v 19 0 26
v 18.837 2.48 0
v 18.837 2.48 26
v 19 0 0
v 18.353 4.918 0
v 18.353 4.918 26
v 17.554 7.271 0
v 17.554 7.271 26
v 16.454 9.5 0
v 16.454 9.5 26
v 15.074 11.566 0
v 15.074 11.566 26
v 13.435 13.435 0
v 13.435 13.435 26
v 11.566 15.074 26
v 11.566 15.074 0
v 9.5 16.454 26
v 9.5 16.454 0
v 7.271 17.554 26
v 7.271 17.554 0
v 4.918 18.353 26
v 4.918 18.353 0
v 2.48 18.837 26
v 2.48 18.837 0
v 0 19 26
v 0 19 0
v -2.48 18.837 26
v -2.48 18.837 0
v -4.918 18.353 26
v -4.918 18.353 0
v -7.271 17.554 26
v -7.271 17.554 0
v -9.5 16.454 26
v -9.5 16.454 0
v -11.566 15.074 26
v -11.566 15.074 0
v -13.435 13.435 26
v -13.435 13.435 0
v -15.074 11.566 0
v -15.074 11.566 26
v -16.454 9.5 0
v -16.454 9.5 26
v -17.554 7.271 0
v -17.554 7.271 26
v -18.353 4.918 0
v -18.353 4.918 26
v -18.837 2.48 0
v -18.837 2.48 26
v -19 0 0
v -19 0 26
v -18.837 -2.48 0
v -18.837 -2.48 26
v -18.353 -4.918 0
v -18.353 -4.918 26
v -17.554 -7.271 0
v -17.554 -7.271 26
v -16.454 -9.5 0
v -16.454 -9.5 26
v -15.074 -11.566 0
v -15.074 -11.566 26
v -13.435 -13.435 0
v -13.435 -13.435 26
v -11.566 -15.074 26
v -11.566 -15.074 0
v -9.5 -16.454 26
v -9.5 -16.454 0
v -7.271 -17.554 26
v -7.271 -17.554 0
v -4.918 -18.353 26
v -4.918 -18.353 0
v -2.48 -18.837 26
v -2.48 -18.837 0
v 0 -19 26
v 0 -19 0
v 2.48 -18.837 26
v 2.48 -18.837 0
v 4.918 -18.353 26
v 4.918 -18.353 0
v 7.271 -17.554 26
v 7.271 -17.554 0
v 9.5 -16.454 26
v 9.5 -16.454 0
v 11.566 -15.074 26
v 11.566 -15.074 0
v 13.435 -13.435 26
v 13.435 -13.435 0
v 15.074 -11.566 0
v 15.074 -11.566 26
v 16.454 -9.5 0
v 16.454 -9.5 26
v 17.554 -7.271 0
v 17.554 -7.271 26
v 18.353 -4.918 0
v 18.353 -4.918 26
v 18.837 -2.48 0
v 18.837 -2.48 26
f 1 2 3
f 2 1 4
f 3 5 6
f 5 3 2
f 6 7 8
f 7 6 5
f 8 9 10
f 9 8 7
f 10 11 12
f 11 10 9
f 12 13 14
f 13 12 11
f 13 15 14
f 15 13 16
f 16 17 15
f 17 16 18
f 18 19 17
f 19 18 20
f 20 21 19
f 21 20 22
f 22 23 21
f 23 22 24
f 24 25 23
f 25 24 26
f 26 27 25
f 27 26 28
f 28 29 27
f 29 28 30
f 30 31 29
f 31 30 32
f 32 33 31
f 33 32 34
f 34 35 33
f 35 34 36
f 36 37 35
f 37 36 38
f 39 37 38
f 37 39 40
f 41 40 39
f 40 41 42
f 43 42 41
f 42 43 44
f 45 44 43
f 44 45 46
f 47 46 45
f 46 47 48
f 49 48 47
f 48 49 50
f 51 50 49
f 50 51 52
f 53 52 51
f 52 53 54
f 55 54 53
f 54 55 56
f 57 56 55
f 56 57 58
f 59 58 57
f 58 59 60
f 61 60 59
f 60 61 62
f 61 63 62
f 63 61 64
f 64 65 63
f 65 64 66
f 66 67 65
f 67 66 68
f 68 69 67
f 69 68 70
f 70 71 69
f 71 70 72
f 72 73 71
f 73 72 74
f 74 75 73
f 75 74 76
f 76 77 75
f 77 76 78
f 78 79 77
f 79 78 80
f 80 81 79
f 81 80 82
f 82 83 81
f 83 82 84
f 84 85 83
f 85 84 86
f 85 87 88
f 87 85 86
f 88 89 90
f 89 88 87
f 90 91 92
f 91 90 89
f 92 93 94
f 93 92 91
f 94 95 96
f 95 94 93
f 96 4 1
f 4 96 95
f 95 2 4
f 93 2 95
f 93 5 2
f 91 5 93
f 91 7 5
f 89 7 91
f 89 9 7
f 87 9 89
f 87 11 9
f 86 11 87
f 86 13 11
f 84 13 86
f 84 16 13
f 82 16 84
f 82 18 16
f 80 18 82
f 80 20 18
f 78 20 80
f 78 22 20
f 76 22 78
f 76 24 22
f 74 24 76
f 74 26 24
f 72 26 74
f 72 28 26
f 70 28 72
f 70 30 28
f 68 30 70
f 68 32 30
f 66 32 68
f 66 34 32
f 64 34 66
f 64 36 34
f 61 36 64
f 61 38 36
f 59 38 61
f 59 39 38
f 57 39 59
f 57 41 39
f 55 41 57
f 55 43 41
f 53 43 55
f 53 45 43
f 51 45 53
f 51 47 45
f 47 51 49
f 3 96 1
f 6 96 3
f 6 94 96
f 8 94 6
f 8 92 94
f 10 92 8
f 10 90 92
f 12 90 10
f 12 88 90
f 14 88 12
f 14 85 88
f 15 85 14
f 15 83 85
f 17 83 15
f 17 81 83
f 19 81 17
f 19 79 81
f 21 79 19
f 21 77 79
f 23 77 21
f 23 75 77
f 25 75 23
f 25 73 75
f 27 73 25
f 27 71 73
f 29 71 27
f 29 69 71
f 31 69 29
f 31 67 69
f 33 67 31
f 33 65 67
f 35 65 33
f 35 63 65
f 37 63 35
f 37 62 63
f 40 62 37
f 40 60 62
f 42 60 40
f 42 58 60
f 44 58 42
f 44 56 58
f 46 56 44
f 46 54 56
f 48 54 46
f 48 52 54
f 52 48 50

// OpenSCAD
// file: ../common/ds_lib.scad
// DronSwarm · librería común de piezas del frame (S07-S08). Unidades: mm.
//
// Reglas (ADR-003): sin hull()/minkowski()/offset() — FreeCAD los convierte en malla y el STEP deja de ser un
// sólido válido. Las formas redondeadas se arman con uniones de cubos y cilindros. El importador CSG de FreeCAD
// también falla con booleanas 2D y con varios operandos agrupados bajo una sola transformación: cada grupo de
// agujeros debe ser hijo directo del difference(), con su propio translate.
//
// Interfaz de motor DronSwarm (DMI, ADR-011): placa con 4 ranuras radiales a 90°, de modo que el mismo soporte
// acepta varios patrones comerciales y, más adelante, el motor propio (S17+) se diseña para caer en el mismo rango.
//   DMI-S: 4×M3, círculo de tornillos Ø16-Ø25 (motores 28xx-41xx, ≤ 600 W)
//   DMI-L: 4×M4, círculo de tornillos Ø30-Ø42 (motores 50xx-70xx, ≤ 2 kW)

$fn = 48;

M3 = 3.3; M3_HEAD = 6.0; M3_NUT = 6.4;     // pasante, cabeza, tuerca (entre caras + juego)
M4 = 4.4; M4_HEAD = 7.5;
M5 = 5.4;

function dmi_bolt(iface) = iface == "L" ? M4 : M3;
function dmi_r(iface) = iface == "L" ? [15, 21] : [8, 12.5];   // radio mínimo y máximo de las ranuras
function dmi_plate_d(iface) = iface == "L" ? 56 : 36;
function dmi_center(iface) = iface == "L" ? 16 : 10;            // eje, seguro y paso de cables

// Rectángulo con esquinas redondeadas (2D) y su extrusión
module rrect2d(size, r) {
    r2 = min(r, size[0] / 2 - 0.01, size[1] / 2 - 0.01);
    union() {
        translate([r2, 0]) square([size[0] - 2 * r2, size[1]]);
        translate([0, r2]) square([size[0], size[1] - 2 * r2]);
        for (x = [r2, size[0] - r2], y = [r2, size[1] - r2]) translate([x, y]) circle(r = r2);
    }
}
// Caja redondeada con primitivas 3D (sin booleanas 2D: el importador CSG de FreeCAD falla con ellas)
module rbox(size, r) {
    r2 = min(r, size[0] / 2 - 0.01, size[1] / 2 - 0.01);
    union() {
        translate([r2, 0, 0]) cube([size[0] - 2 * r2, size[1], size[2]]);
        translate([0, r2, 0]) cube([size[0], size[1] - 2 * r2, size[2]]);
        for (x = [r2, size[0] - r2], y = [r2, size[1] - r2]) translate([x, y, 0]) cylinder(r = r2, h = size[2]);
    }
}
module crbox(size, r) { translate([-size[0] / 2, -size[1] / 2, 0]) rbox(size, r); }   // centrado en x/y

// Ranura (2D) entre dos puntos sobre el eje x
module slot2d(r0, r1, w) {
    union() {
        translate([r0, -w / 2]) square([r1 - r0, w]);
        translate([r0, 0]) circle(d = w);
        translate([r1, 0]) circle(d = w);
    }
}

// Agujeros de la interfaz de motor (para restar de una placa de espesor t)
module slot3d(r0, r1, w, h) {
    union() {
        translate([r0, -w / 2, 0]) cube([r1 - r0, w, h]);
        translate([r0, 0, 0]) cylinder(d = w, h = h);
        translate([r1, 0, 0]) cylinder(d = w, h = h);
    }
}
module dmi_holes(iface, t) {
    r = dmi_r(iface);
    translate([0, 0, -1]) union() {
        cylinder(d = dmi_center(iface), h = t + 2);
        for (a = [45, 135, 225, 315]) rotate(a) slot3d(r[0], r[1], dmi_bolt(iface), t + 2);
    }
}

// Soporte de motor en la punta del brazo: manguito sobre el tubo + placa DMI arriba
//   el tubo entra por -x; la placa queda centrada en el eje del motor (origen), cara superior en z = 0
module motor_mount(tube_d, iface = "S", sleeve = 34, wall = 3.5) {
    od = tube_d + 2 * wall;
    pd = dmi_plate_d(iface);
    pt = iface == "L" ? 6 : 4;
    zc = -pt - tube_d / 2 - 1;                 // eje del tubo bajo la placa
    difference() {
        union() {
            translate([0, 0, -pt]) cylinder(d = pd, h = pt);                         // placa DMI
            translate([-sleeve - pd / 2 + 6, 0, zc]) rotate([0, 90, 0])
                cylinder(d = od, h = sleeve + pd / 2 - 6 + 4);                       // manguito
            translate([-sleeve - pd / 2 + 6, -od / 2, zc]) cube([sleeve + pd / 2 - 2, od, -zc - pt + 0.01]);  // alma
            translate([-sleeve - pd / 2 + 6, -5, zc - od / 2 - 7]) cube([sleeve, 10, 8]);   // oreja de apriete
        }
        dmi_holes(iface, pt + 0.02, $fn = 32);
        translate([-sleeve - pd / 2 + 5, 0, zc]) rotate([0, 90, 0]) cylinder(d = tube_d + 0.3, h = sleeve + pd / 2 - 3); // tubo
        translate([-sleeve - pd / 2 + 4, -1, zc - od / 2 - 8]) cube([sleeve + 1, 2, od / 2 + 6]);   // ranura de apriete
        for (x = [0.3, 0.75]) translate([-sleeve - pd / 2 + 6 + x * sleeve, 0, zc - od / 2 - 3])
            rotate([90, 0, 0]) cylinder(d = M3, h = 30, center = true);                // tornillos de apriete
        translate([-pd / 2 - 2, 0, zc]) rotate([0, 90, 0]) cylinder(d = 7, h = pd);   // salida de cables del tubo
    }
}

// Bloque de brazo entre las dos placas centrales (impreso PA12-CF): sujeta el tubo y separa las placas.
//   el tubo sale por +x desde el origen; el bloque ocupa x ∈ [-len, 0], altura = gap
module arm_block(tube_d, gap, len = 40, width = 0, bolt = M3) {
    w = width > 0 ? width : tube_d + 14;
    difference() {
        translate([-len, -w / 2, 0]) rbox([len, w, gap], 2);
        translate([-len - 1, 0, gap / 2]) rotate([0, 90, 0]) cylinder(d = tube_d + 0.2, h = len + 2);   // tubo
        translate([-len - 1, -0.75, gap / 2]) cube([len + 2, 1.5, gap / 2 + 1]);                        // ranura de apriete
        for (p = arm_block_bolts(tube_d, len, w)) translate([p[0], p[1], -1]) cylinder(d = bolt, h = gap + 2);
        translate([-len * 0.5, 0, gap * 0.78]) rotate([90, 0, 0]) cylinder(d = M3, h = w + 2, center = true);  // apriete
    }
}
function arm_block_bolts(tube_d, len, w) =
    [for (x = [-len + 6, -6], y = [-(w / 2 - 3.6), w / 2 - 3.6]) [x, y]];

// Patrón de controladora de vuelo (agujeros M3 en cuadrado)
module fc_holes(pattern, t) {
    for (x = [-1, 1], y = [-1, 1]) translate([x * pattern / 2, y * pattern / 2, -1]) cylinder(d = M3, h = t + 2);
}
// file: ds_i_params.scad
// DS-I · parámetros generados por tools/cad/gen_cad_params.py el 2026-10-19
// desde engineering/data/results (spec v1). No editar a mano: regenerar. Unidades: mm, kg.

vehicle = "DS-I";
rotors = 4;
wheelbase = 672;
arm_radius = 336;
prop_d = 431.8;
tube_od = 20;
tube_wall = 1;
arm_len = 252;
plate_d = 168;
plate_t = 3;
plate_gap = 26;
motor_iface = "S";
battery_dims = [134.4, 76.2, 48.8];
battery = "6S2P 50S";
leg_h = 160;
fold_arms = false;
mtow_kg = 2.695;
motor_mass_kg = 0.074;
fc_pattern = 30.5;
gimbal_box = [90, 70, 105];
gimbal_damper_pitch = [60, 50];
// file: ds_i_frame.scad
// DS-I · geometría compartida del frame: posiciones derivadas de los parámetros (spec v1). Unidades: mm.
// Ejes: x adelante, y izquierda, z arriba. z = 0 es la cara superior de la placa inferior.
// Cada pieza vive en su propio archivo (center_plate.scad, arm_block.scad, …) e incluye este.

include <ds_i_params.scad>
use <../common/ds_lib.scad>
include <../common/ds_lib.scad>

arm_angles = [45, 135, 225, 315];         // quad X
block_len = 40;
block_w = tube_od + 14;
r_block_out = plate_d / 2 - 3;            // extremo exterior del bloque de brazo
tube_z = plate_gap / 2;                   // eje de los tubos
tube_len = arm_radius - r_block_out + block_len - 8;   // dentro del bloque hasta el soporte de motor
leg_offset = 70;                          // patas abrazadas al brazo, a esta distancia del bloque
leg_r = r_block_out + leg_offset;
leg_tube = 12;                            // tubo de las patas Ø12×1
battery_pos = [-28, 0];                   // batería transversal, atrás, bajo la placa
gimbal_pos = [62, 0];                     // cámara adelante, colgada con amortiguadores
housing_size = [120, 90, 58];             // carcasa IP54 sobre la placa superior
housing_pos = [0, 0];

// Contorno de las placas centrales (2D): círculo con lóbulos bajo cada bloque de brazo
module plate_outline() {
    union() {
        circle(d = plate_d, $fn = 96);
        for (a = arm_angles) rotate(a) translate([r_block_out - block_len - 4, -block_w / 2 - 4]) square([block_len + 7, block_w + 8]);
    }
}

// Agujeros comunes a ambas placas: tornillos de los bloques
module plate_common_holes() {
    for (a = arm_angles) rotate(a) translate([r_block_out, 0])
        for (p = arm_block_bolts(tube_od, block_len, block_w)) translate(p) circle(d = M3);
}

// Posiciones de piezas montadas en las placas
gimbal_mount_bolts = [for (x = [-25, 25], y = [-32, 32]) [gimbal_pos[0] - 15 + x, y]];   // adaptador bajo la placa
battery_tray_bolts = [for (x = [-30, 30], y = [-46, 46]) [battery_pos[0] + x, y]];
housing_flange = 10;
// tornillos de la brida a 6 mm de la pared (afuera del canal de la junta, que va de 0.6 a 2.6 mm)
housing_bolts = [[66, 0], [-66, 0], [0, 51], [0, -51], [40, 51], [40, -51], [-40, 51], [-40, -51]];
cable_gland_pos = [-housing_size[0] / 2 + 18, 0];      // paso de cables al interior de la carcasa (prensaestopa M12)
motor_d = motor_iface == "L" ? 62 : 38;   // motor de referencia (COTS, se confirma en S09)
motor_h = motor_iface == "L" ? 36 : 26;
tray_t = 3;                               // bandeja de batería
gm_t = 4;                                 // placas del adaptador de cámara
damper_h = 10;                            // amortiguadores de silicona
foot_h = 45;                              // pie amortiguador de TPU (≈ 30 mm de carrera)
foot_stroke = 30;
// Altura de las patas por condición de diseño: con el pie comprimido, la cámara no toca el suelo (10 mm de margen)
gimbal_bottom_z = -plate_t - 2 * gm_t - damper_h - gimbal_box[2];
ground_z = gimbal_bottom_z - foot_stroke - 10;
leg_top_z = tube_z - (tube_od + 8) / 2 - 2;     // tope del tubo de la pata dentro de la abrazadera
leg_len = (leg_top_z - ground_z) - (foot_h - 12);
mm_sleeve = 26;                           // manguito del soporte de motor (FEA: FS 37 con 34 mm, se acorta)
// main file
// DS-I · componentes comerciales de referencia (no se fabrican): sirven para holguras, interferencias y masas.
// Medidas típicas de hoja de datos; se confirman en la selección del S09.   which = nombre del componente
include <ds_i_frame.scad>
which = "motor";
module ref(which) {
    if (which == "motor") cylinder(d = motor_d, h = motor_h);                                   // base en z = 0
    if (which == "prop") cylinder(d = prop_d, h = 2, $fn = 96);                                 // disco de la hélice
    if (which == "battery") translate([0, 0, -battery_dims[2]]) crbox([battery_dims[1], battery_dims[0], battery_dims[2]], 4);
    if (which == "gimbal") translate([0, 0, -gimbal_box[2]]) crbox([gimbal_box[0], gimbal_box[1], gimbal_box[2]], 8);
    if (which == "damper") cylinder(d = 9, h = 10);
    if (which == "fc_stack") crbox([36, 36, 24], 3);                                           // FC + ESC 4 en 1
    if (which == "companion") crbox([65, 35, 14], 3);
    if (which == "gnss") cylinder(d = 40, h = 12);
}
ref(which);
